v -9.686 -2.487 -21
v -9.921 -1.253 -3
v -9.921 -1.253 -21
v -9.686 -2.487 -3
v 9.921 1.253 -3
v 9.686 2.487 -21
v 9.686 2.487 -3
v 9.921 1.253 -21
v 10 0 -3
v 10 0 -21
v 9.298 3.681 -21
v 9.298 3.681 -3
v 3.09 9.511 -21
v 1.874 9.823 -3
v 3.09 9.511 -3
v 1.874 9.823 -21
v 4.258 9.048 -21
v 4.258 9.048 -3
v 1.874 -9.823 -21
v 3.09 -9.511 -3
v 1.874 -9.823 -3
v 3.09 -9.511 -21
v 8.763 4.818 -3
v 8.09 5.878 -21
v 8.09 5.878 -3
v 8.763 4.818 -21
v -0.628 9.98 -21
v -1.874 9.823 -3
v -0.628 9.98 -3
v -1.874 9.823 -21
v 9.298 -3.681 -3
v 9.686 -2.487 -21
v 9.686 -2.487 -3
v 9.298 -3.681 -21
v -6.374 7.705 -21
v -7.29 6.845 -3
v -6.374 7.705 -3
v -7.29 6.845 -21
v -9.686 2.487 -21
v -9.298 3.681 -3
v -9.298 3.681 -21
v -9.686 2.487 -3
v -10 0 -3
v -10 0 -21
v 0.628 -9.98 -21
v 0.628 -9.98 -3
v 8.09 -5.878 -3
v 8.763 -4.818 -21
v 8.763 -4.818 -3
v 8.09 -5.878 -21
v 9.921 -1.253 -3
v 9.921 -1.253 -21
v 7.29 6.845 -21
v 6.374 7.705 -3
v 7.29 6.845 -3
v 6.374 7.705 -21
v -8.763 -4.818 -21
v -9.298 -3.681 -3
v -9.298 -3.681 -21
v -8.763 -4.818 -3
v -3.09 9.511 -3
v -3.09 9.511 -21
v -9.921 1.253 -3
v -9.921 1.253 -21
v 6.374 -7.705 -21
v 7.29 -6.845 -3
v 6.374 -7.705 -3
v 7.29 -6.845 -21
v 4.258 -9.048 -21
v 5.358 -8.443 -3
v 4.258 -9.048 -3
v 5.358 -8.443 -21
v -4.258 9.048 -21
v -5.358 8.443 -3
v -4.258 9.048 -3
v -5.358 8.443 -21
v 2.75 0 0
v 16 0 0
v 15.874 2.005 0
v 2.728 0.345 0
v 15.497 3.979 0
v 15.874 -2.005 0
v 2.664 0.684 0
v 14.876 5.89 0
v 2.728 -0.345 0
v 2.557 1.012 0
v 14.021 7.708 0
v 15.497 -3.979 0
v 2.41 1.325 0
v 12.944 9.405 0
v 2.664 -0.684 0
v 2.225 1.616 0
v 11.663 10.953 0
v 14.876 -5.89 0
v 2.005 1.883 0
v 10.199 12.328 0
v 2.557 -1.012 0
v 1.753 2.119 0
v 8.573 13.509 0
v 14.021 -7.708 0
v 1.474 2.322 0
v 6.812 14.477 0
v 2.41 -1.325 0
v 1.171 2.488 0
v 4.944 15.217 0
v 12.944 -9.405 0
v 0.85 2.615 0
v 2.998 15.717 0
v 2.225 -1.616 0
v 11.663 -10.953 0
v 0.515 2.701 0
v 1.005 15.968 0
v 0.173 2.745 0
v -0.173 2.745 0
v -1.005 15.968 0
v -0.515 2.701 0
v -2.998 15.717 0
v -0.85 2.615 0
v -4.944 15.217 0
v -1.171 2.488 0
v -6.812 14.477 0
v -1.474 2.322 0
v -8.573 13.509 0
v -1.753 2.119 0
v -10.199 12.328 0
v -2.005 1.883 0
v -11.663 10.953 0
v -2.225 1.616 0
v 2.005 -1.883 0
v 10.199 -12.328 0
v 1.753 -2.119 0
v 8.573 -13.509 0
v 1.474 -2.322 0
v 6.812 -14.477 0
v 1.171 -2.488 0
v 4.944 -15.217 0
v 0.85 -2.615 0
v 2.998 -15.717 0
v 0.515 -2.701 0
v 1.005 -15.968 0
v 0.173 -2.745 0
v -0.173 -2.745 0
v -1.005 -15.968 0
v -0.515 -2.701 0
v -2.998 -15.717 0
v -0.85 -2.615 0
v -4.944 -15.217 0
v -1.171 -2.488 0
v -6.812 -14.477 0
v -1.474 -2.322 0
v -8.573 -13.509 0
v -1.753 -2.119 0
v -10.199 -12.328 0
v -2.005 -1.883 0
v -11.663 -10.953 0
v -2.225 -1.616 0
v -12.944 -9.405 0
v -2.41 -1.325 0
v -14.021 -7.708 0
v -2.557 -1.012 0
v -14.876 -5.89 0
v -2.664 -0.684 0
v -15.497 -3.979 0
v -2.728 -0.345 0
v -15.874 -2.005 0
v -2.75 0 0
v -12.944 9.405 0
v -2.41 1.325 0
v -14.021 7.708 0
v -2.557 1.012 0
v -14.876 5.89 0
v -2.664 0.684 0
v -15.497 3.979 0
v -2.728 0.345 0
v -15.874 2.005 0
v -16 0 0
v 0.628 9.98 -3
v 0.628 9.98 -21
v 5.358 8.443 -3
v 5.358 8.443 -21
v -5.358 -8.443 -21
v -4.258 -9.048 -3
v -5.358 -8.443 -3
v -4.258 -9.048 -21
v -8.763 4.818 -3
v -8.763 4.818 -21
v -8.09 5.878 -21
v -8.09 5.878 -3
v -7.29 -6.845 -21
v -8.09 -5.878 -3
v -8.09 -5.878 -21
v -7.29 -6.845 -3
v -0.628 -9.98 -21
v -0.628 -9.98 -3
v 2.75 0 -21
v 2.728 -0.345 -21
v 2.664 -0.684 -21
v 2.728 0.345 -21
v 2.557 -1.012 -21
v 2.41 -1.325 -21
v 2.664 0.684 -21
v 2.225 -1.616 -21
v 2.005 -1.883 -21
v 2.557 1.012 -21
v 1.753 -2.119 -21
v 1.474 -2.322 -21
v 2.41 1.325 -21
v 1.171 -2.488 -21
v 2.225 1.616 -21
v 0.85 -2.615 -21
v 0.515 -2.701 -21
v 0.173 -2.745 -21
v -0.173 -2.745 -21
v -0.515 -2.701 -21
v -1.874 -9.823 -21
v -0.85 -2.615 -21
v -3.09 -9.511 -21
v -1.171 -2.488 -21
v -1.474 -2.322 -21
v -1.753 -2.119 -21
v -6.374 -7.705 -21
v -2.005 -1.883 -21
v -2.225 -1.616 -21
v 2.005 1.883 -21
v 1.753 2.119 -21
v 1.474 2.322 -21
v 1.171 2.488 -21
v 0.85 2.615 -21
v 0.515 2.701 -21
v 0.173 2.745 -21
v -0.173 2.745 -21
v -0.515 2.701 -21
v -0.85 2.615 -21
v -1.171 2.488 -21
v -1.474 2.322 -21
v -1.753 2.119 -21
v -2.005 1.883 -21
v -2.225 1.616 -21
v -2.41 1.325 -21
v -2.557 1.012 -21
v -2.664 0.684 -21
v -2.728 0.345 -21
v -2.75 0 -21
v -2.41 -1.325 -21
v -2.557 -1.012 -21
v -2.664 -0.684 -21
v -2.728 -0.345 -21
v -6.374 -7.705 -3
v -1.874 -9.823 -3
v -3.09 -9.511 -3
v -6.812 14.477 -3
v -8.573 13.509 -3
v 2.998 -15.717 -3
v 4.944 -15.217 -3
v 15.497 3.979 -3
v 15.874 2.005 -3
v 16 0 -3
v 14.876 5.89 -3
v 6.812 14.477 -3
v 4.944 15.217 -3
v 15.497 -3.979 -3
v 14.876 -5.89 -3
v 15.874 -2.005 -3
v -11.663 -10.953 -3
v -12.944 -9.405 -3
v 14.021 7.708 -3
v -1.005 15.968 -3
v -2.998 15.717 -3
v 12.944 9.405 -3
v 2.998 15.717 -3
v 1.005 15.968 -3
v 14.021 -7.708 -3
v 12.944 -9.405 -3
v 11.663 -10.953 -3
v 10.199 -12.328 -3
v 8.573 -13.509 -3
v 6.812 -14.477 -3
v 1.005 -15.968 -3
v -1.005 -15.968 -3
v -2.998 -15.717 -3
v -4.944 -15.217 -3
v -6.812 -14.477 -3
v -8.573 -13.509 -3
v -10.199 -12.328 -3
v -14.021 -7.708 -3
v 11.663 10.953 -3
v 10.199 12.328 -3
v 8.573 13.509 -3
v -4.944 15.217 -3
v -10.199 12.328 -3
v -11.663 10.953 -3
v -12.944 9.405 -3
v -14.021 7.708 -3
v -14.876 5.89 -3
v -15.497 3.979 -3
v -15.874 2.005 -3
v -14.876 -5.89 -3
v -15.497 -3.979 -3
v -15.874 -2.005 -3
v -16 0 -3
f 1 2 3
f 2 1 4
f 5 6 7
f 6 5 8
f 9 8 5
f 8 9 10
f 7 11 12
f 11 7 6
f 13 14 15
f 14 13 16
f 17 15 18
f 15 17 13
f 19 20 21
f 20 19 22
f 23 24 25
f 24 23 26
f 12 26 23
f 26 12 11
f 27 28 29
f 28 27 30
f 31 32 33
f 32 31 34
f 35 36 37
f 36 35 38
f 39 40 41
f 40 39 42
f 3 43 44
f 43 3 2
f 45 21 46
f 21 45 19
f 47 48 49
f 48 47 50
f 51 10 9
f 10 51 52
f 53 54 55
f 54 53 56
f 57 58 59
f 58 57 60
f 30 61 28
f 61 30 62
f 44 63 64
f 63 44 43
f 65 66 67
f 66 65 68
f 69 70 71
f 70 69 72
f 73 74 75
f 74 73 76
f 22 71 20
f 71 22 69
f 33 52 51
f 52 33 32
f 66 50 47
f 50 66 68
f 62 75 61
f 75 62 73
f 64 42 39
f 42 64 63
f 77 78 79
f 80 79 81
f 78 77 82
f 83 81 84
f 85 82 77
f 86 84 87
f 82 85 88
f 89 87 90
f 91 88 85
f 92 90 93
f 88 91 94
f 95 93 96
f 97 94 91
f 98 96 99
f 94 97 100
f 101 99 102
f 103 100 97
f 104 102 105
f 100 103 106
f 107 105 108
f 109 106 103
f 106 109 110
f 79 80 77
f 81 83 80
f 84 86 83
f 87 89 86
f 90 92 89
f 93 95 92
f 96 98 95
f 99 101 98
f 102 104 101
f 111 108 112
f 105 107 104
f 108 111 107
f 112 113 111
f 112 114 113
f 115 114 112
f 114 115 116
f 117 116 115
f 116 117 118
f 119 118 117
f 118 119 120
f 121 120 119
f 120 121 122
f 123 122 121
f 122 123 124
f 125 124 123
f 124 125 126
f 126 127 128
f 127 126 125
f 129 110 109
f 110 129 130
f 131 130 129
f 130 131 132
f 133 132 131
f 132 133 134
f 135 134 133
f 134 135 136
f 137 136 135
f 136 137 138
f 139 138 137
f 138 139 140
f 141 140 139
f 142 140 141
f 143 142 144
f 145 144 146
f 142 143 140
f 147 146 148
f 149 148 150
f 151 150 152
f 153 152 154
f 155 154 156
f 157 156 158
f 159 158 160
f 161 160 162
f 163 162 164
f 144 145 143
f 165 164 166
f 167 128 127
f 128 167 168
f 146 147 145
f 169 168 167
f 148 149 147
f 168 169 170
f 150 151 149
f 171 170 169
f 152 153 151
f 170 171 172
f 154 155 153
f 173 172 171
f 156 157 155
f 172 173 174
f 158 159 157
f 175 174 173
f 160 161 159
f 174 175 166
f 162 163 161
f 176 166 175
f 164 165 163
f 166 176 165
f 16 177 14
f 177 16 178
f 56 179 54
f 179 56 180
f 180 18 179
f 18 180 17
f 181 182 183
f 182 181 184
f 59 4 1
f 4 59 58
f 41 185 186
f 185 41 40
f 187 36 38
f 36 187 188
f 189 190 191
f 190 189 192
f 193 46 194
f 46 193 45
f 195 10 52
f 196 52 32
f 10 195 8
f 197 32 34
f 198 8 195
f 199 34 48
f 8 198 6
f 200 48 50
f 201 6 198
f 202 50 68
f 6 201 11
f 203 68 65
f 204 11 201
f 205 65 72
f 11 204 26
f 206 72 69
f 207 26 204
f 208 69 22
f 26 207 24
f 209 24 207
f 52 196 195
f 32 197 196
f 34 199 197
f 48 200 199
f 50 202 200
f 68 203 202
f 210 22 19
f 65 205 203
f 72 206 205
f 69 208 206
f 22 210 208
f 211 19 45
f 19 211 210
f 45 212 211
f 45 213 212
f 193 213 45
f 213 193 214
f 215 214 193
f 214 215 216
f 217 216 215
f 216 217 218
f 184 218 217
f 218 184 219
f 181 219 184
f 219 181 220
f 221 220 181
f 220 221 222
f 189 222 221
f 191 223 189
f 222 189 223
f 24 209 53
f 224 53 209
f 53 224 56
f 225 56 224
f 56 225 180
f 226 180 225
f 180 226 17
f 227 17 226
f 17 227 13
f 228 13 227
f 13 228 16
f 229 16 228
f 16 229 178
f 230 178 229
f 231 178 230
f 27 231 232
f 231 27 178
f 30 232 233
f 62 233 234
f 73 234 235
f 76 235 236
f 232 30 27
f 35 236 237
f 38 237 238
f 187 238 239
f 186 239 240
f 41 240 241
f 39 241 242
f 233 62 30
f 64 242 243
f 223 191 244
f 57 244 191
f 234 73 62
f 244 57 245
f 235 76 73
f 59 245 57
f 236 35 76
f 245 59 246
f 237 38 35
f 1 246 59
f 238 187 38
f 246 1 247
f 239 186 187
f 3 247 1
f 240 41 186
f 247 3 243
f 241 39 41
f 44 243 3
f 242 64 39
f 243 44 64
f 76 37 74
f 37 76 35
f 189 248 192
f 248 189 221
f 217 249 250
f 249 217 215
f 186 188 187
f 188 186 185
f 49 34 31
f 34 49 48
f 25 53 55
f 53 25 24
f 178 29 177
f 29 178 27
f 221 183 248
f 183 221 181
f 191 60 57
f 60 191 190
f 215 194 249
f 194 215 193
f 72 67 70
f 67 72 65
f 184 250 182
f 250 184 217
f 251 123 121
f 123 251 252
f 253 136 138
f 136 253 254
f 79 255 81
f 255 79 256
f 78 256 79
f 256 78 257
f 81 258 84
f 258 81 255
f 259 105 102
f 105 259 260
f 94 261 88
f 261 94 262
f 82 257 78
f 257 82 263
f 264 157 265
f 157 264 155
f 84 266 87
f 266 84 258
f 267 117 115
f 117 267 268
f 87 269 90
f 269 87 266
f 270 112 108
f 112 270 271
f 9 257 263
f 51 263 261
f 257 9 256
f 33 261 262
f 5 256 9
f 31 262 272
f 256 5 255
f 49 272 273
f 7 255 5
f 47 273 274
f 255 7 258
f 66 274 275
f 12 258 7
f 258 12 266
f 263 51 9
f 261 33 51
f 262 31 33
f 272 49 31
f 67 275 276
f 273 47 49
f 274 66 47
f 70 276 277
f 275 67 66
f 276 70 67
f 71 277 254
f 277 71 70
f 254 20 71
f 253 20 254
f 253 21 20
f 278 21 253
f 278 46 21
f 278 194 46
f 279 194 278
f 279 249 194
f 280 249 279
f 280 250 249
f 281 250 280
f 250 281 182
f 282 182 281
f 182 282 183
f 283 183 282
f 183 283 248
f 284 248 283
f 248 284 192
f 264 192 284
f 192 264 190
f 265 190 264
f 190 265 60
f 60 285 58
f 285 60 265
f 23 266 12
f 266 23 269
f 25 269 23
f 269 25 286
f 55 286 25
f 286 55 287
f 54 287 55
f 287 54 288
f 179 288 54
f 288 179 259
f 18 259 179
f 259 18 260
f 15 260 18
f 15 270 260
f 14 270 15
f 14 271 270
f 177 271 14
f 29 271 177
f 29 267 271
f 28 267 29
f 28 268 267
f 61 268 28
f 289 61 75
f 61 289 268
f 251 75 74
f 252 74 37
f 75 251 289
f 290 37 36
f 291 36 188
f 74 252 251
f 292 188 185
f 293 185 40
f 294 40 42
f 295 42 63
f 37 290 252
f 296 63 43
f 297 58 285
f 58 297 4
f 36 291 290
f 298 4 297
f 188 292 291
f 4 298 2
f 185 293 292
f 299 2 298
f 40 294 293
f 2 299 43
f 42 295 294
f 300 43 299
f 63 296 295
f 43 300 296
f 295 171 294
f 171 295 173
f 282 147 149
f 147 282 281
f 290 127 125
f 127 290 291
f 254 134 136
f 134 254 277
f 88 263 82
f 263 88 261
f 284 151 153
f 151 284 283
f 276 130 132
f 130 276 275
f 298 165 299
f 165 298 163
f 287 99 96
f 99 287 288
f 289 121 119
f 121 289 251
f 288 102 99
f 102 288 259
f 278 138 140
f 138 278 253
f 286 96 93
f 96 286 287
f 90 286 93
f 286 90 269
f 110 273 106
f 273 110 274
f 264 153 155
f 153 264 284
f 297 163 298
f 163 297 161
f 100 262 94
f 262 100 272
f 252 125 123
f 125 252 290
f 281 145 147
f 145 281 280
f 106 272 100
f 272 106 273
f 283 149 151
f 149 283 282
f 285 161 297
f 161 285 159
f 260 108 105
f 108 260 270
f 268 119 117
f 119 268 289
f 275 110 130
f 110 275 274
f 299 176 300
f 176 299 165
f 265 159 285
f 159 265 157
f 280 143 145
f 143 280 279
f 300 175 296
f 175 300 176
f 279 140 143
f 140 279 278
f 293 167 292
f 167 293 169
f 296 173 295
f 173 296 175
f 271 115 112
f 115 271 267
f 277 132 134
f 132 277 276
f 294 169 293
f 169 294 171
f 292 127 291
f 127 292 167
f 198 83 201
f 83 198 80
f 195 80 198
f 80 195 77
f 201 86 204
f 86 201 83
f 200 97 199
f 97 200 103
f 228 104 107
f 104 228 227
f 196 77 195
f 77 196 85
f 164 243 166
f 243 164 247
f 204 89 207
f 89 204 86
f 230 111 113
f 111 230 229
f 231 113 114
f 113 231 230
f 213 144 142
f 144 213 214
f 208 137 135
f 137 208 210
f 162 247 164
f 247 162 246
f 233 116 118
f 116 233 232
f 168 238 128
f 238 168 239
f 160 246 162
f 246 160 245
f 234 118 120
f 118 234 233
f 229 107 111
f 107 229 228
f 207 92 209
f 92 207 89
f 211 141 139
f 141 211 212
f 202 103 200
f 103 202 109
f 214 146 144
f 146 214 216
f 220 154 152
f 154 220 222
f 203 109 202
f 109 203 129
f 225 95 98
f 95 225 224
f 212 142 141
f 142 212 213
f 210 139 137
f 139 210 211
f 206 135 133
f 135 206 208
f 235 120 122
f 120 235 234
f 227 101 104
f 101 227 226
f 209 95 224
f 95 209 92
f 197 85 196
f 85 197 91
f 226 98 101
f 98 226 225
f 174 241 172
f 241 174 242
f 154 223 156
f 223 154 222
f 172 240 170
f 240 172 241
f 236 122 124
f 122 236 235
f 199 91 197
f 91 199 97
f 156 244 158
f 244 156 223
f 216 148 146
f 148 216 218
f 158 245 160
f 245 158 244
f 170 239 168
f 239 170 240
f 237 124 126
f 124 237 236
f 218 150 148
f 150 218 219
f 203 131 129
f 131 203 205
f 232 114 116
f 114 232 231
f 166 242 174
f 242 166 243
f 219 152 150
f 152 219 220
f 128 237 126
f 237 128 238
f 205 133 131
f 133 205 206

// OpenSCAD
$fn = 50;


difference() {
	union() {
		translate(v = [0, 0, -21.0000000000]) {
			cylinder(h = 21, r = 10.0000000000);
		}
		translate(v = [0, 0, -3.0000000000]) {
			cylinder(h = 3, r = 16.0000000000);
		}
	}
	union() {
		#translate(v = [0, 0, -21]) {
			cylinder(h = 21, r = 2.7500000000);
		}
	}
}
